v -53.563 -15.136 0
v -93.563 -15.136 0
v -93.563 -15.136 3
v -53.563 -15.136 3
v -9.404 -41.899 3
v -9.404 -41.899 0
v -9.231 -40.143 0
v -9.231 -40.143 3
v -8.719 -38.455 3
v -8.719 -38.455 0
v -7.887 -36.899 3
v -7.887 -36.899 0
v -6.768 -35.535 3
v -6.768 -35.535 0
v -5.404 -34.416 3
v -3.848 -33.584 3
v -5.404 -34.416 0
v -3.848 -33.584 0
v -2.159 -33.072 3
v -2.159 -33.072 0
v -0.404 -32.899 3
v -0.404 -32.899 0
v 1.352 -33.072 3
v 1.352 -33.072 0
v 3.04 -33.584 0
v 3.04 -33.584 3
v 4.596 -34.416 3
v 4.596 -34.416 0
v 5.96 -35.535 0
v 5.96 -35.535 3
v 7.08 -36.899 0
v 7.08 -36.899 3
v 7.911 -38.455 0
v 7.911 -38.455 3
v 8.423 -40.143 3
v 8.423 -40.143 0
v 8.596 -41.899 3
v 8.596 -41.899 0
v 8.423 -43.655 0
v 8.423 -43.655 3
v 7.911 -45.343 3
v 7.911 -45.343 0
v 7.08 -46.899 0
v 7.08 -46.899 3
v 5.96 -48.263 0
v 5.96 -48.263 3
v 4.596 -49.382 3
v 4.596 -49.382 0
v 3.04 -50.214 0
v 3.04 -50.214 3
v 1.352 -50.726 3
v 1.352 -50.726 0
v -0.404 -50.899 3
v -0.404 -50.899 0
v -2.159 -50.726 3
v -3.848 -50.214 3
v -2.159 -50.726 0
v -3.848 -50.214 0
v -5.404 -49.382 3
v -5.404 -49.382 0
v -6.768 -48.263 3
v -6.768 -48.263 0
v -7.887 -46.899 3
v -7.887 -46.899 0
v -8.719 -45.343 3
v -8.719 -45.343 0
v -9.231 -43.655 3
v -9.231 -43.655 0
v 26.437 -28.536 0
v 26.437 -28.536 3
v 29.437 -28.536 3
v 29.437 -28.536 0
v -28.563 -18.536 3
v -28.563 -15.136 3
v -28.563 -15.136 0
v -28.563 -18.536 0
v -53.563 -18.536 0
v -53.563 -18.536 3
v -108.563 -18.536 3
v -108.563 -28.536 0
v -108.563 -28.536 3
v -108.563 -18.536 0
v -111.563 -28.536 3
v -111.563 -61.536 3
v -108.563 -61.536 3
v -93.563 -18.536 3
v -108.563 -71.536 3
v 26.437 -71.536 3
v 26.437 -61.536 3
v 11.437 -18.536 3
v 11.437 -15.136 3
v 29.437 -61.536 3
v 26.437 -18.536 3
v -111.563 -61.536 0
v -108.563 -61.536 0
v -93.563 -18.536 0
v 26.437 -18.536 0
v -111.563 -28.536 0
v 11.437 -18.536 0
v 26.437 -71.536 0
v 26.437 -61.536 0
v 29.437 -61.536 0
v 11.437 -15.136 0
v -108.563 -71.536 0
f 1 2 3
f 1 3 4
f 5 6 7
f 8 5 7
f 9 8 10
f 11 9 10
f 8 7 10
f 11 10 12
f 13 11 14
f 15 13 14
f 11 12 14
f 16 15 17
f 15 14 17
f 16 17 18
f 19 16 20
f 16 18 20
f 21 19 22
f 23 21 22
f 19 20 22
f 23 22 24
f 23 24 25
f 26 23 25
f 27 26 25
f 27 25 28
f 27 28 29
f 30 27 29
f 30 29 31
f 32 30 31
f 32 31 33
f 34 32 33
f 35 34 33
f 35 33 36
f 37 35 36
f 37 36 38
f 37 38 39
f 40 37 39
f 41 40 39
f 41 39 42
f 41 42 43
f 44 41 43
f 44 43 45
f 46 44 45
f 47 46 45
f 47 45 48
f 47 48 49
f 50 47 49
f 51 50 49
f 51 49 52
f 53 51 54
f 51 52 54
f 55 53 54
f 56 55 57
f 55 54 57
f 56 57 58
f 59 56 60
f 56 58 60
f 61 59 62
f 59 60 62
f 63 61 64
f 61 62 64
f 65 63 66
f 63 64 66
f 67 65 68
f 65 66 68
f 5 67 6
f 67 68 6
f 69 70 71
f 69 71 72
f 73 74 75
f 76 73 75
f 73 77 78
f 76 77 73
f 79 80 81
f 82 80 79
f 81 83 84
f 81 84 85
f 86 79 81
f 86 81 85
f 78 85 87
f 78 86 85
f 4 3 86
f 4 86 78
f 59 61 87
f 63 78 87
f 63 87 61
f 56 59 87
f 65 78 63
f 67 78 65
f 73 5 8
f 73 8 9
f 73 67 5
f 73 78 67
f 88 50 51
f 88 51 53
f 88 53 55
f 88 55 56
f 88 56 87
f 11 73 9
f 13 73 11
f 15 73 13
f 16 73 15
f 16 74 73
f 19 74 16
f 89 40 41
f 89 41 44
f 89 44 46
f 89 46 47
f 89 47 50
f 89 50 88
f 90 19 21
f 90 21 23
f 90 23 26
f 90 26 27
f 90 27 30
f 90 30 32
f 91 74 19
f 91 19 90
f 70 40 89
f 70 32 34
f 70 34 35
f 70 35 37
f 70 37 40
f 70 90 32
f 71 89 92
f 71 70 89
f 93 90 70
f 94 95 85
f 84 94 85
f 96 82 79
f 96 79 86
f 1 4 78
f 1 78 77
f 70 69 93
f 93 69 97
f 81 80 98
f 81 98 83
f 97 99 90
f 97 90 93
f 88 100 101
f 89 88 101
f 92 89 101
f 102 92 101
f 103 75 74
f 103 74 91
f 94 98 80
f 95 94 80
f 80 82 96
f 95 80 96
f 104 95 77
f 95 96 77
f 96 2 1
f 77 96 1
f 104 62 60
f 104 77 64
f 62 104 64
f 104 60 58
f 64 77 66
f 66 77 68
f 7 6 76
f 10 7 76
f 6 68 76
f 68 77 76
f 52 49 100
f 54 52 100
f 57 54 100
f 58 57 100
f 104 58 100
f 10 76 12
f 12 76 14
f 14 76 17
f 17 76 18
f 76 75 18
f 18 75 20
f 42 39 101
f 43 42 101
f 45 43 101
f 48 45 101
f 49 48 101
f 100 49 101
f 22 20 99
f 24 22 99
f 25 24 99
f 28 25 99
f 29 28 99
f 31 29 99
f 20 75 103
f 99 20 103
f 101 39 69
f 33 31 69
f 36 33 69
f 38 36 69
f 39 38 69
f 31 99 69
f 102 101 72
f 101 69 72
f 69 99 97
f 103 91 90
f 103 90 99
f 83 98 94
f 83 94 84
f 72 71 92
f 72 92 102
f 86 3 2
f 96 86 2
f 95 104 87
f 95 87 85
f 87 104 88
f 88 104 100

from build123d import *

# Parameters (mm, degrees)
ESQUISSE1_W             = 135
ESQUISSE1_H             = 53
BOSS_EXTRU_1_DEPTH      = 3
ESQUISSE2_R             = 9
ENL_V_MAT_EXTRU_1_DEPTH = 4
ESQUISSE3_W             = 3
ESQUISSE3_H             = 33
BOSS_EXTRU_2_DEPTH      = 3
ESQUISSE4_W             = 3
ESQUISSE4_H             = 33
BOSS_EXTRU_3_DEPTH      = 3
ESQUISSE5_W             = 40
ESQUISSE5_H             = 3
BOSS_EXTRU_4_DEPTH      = 3.4
ESQUISSE6_W             = 40
ESQUISSE6_H             = 3
BOSS_EXTRU_5_DEPTH      = 3.4


with BuildPart() as part:
    # Esquisse1 → Boss.-Extru.1 (new body)
    with BuildSketch(Plane.XY):
        with Locations((-41.062592566, -45.035528327)):
            Rectangle(ESQUISSE1_W, ESQUISSE1_H)
    extrude(amount=BOSS_EXTRU_1_DEPTH)

    # Esquisse2 → Enlèv. mat.-Extru.1 (cut, through all)
    with BuildSketch(Plane(origin=(0, 0, 0), x_dir=(-1, 0, 0), z_dir=(0, 0, -1))):
        with Locations((0.403677713, -41.89919031)):
            Circle(ESQUISSE2_R)
    extrude(amount=-ENL_V_MAT_EXTRU_1_DEPTH, mode=Mode.SUBTRACT)

    # Esquisse3 → Boss.-Extru.2 (add)
    with BuildSketch(Plane(origin=(26.437407434, 0, 0), x_dir=(0, 0, -1), z_dir=(1, 0, 0))):
        with Locations((-1.5, -45.035528327)):
            Rectangle(ESQUISSE3_W, ESQUISSE3_H)
    extrude(amount=BOSS_EXTRU_2_DEPTH)

    # Esquisse4 → Boss.-Extru.3 (add)
    with BuildSketch(Plane.ZY.offset(108.562592566)):
        with Locations((1.5, -45.035528327)):
            Rectangle(ESQUISSE4_W, ESQUISSE4_H)
    extrude(amount=BOSS_EXTRU_3_DEPTH)

    # Esquisse5 → Boss.-Extru.4 (add)
    with BuildSketch(Plane(origin=(0, -18.535528327, 0), x_dir=(1, 0, 0), z_dir=(0, 1, 0))):
        with Locations((-73.562592566, -1.5)):
            Rectangle(ESQUISSE5_W, ESQUISSE5_H)
    extrude(amount=BOSS_EXTRU_4_DEPTH)

    # Esquisse6 → Boss.-Extru.5 (add)
    with BuildSketch(Plane(origin=(0, -18.535528327, 0), x_dir=(1, 0, 0), z_dir=(0, 1, 0))):
        with Locations((-8.562592566, -1.5)):
            Rectangle(ESQUISSE6_W, ESQUISSE6_H)
    extrude(amount=BOSS_EXTRU_5_DEPTH)


solid = part.part
